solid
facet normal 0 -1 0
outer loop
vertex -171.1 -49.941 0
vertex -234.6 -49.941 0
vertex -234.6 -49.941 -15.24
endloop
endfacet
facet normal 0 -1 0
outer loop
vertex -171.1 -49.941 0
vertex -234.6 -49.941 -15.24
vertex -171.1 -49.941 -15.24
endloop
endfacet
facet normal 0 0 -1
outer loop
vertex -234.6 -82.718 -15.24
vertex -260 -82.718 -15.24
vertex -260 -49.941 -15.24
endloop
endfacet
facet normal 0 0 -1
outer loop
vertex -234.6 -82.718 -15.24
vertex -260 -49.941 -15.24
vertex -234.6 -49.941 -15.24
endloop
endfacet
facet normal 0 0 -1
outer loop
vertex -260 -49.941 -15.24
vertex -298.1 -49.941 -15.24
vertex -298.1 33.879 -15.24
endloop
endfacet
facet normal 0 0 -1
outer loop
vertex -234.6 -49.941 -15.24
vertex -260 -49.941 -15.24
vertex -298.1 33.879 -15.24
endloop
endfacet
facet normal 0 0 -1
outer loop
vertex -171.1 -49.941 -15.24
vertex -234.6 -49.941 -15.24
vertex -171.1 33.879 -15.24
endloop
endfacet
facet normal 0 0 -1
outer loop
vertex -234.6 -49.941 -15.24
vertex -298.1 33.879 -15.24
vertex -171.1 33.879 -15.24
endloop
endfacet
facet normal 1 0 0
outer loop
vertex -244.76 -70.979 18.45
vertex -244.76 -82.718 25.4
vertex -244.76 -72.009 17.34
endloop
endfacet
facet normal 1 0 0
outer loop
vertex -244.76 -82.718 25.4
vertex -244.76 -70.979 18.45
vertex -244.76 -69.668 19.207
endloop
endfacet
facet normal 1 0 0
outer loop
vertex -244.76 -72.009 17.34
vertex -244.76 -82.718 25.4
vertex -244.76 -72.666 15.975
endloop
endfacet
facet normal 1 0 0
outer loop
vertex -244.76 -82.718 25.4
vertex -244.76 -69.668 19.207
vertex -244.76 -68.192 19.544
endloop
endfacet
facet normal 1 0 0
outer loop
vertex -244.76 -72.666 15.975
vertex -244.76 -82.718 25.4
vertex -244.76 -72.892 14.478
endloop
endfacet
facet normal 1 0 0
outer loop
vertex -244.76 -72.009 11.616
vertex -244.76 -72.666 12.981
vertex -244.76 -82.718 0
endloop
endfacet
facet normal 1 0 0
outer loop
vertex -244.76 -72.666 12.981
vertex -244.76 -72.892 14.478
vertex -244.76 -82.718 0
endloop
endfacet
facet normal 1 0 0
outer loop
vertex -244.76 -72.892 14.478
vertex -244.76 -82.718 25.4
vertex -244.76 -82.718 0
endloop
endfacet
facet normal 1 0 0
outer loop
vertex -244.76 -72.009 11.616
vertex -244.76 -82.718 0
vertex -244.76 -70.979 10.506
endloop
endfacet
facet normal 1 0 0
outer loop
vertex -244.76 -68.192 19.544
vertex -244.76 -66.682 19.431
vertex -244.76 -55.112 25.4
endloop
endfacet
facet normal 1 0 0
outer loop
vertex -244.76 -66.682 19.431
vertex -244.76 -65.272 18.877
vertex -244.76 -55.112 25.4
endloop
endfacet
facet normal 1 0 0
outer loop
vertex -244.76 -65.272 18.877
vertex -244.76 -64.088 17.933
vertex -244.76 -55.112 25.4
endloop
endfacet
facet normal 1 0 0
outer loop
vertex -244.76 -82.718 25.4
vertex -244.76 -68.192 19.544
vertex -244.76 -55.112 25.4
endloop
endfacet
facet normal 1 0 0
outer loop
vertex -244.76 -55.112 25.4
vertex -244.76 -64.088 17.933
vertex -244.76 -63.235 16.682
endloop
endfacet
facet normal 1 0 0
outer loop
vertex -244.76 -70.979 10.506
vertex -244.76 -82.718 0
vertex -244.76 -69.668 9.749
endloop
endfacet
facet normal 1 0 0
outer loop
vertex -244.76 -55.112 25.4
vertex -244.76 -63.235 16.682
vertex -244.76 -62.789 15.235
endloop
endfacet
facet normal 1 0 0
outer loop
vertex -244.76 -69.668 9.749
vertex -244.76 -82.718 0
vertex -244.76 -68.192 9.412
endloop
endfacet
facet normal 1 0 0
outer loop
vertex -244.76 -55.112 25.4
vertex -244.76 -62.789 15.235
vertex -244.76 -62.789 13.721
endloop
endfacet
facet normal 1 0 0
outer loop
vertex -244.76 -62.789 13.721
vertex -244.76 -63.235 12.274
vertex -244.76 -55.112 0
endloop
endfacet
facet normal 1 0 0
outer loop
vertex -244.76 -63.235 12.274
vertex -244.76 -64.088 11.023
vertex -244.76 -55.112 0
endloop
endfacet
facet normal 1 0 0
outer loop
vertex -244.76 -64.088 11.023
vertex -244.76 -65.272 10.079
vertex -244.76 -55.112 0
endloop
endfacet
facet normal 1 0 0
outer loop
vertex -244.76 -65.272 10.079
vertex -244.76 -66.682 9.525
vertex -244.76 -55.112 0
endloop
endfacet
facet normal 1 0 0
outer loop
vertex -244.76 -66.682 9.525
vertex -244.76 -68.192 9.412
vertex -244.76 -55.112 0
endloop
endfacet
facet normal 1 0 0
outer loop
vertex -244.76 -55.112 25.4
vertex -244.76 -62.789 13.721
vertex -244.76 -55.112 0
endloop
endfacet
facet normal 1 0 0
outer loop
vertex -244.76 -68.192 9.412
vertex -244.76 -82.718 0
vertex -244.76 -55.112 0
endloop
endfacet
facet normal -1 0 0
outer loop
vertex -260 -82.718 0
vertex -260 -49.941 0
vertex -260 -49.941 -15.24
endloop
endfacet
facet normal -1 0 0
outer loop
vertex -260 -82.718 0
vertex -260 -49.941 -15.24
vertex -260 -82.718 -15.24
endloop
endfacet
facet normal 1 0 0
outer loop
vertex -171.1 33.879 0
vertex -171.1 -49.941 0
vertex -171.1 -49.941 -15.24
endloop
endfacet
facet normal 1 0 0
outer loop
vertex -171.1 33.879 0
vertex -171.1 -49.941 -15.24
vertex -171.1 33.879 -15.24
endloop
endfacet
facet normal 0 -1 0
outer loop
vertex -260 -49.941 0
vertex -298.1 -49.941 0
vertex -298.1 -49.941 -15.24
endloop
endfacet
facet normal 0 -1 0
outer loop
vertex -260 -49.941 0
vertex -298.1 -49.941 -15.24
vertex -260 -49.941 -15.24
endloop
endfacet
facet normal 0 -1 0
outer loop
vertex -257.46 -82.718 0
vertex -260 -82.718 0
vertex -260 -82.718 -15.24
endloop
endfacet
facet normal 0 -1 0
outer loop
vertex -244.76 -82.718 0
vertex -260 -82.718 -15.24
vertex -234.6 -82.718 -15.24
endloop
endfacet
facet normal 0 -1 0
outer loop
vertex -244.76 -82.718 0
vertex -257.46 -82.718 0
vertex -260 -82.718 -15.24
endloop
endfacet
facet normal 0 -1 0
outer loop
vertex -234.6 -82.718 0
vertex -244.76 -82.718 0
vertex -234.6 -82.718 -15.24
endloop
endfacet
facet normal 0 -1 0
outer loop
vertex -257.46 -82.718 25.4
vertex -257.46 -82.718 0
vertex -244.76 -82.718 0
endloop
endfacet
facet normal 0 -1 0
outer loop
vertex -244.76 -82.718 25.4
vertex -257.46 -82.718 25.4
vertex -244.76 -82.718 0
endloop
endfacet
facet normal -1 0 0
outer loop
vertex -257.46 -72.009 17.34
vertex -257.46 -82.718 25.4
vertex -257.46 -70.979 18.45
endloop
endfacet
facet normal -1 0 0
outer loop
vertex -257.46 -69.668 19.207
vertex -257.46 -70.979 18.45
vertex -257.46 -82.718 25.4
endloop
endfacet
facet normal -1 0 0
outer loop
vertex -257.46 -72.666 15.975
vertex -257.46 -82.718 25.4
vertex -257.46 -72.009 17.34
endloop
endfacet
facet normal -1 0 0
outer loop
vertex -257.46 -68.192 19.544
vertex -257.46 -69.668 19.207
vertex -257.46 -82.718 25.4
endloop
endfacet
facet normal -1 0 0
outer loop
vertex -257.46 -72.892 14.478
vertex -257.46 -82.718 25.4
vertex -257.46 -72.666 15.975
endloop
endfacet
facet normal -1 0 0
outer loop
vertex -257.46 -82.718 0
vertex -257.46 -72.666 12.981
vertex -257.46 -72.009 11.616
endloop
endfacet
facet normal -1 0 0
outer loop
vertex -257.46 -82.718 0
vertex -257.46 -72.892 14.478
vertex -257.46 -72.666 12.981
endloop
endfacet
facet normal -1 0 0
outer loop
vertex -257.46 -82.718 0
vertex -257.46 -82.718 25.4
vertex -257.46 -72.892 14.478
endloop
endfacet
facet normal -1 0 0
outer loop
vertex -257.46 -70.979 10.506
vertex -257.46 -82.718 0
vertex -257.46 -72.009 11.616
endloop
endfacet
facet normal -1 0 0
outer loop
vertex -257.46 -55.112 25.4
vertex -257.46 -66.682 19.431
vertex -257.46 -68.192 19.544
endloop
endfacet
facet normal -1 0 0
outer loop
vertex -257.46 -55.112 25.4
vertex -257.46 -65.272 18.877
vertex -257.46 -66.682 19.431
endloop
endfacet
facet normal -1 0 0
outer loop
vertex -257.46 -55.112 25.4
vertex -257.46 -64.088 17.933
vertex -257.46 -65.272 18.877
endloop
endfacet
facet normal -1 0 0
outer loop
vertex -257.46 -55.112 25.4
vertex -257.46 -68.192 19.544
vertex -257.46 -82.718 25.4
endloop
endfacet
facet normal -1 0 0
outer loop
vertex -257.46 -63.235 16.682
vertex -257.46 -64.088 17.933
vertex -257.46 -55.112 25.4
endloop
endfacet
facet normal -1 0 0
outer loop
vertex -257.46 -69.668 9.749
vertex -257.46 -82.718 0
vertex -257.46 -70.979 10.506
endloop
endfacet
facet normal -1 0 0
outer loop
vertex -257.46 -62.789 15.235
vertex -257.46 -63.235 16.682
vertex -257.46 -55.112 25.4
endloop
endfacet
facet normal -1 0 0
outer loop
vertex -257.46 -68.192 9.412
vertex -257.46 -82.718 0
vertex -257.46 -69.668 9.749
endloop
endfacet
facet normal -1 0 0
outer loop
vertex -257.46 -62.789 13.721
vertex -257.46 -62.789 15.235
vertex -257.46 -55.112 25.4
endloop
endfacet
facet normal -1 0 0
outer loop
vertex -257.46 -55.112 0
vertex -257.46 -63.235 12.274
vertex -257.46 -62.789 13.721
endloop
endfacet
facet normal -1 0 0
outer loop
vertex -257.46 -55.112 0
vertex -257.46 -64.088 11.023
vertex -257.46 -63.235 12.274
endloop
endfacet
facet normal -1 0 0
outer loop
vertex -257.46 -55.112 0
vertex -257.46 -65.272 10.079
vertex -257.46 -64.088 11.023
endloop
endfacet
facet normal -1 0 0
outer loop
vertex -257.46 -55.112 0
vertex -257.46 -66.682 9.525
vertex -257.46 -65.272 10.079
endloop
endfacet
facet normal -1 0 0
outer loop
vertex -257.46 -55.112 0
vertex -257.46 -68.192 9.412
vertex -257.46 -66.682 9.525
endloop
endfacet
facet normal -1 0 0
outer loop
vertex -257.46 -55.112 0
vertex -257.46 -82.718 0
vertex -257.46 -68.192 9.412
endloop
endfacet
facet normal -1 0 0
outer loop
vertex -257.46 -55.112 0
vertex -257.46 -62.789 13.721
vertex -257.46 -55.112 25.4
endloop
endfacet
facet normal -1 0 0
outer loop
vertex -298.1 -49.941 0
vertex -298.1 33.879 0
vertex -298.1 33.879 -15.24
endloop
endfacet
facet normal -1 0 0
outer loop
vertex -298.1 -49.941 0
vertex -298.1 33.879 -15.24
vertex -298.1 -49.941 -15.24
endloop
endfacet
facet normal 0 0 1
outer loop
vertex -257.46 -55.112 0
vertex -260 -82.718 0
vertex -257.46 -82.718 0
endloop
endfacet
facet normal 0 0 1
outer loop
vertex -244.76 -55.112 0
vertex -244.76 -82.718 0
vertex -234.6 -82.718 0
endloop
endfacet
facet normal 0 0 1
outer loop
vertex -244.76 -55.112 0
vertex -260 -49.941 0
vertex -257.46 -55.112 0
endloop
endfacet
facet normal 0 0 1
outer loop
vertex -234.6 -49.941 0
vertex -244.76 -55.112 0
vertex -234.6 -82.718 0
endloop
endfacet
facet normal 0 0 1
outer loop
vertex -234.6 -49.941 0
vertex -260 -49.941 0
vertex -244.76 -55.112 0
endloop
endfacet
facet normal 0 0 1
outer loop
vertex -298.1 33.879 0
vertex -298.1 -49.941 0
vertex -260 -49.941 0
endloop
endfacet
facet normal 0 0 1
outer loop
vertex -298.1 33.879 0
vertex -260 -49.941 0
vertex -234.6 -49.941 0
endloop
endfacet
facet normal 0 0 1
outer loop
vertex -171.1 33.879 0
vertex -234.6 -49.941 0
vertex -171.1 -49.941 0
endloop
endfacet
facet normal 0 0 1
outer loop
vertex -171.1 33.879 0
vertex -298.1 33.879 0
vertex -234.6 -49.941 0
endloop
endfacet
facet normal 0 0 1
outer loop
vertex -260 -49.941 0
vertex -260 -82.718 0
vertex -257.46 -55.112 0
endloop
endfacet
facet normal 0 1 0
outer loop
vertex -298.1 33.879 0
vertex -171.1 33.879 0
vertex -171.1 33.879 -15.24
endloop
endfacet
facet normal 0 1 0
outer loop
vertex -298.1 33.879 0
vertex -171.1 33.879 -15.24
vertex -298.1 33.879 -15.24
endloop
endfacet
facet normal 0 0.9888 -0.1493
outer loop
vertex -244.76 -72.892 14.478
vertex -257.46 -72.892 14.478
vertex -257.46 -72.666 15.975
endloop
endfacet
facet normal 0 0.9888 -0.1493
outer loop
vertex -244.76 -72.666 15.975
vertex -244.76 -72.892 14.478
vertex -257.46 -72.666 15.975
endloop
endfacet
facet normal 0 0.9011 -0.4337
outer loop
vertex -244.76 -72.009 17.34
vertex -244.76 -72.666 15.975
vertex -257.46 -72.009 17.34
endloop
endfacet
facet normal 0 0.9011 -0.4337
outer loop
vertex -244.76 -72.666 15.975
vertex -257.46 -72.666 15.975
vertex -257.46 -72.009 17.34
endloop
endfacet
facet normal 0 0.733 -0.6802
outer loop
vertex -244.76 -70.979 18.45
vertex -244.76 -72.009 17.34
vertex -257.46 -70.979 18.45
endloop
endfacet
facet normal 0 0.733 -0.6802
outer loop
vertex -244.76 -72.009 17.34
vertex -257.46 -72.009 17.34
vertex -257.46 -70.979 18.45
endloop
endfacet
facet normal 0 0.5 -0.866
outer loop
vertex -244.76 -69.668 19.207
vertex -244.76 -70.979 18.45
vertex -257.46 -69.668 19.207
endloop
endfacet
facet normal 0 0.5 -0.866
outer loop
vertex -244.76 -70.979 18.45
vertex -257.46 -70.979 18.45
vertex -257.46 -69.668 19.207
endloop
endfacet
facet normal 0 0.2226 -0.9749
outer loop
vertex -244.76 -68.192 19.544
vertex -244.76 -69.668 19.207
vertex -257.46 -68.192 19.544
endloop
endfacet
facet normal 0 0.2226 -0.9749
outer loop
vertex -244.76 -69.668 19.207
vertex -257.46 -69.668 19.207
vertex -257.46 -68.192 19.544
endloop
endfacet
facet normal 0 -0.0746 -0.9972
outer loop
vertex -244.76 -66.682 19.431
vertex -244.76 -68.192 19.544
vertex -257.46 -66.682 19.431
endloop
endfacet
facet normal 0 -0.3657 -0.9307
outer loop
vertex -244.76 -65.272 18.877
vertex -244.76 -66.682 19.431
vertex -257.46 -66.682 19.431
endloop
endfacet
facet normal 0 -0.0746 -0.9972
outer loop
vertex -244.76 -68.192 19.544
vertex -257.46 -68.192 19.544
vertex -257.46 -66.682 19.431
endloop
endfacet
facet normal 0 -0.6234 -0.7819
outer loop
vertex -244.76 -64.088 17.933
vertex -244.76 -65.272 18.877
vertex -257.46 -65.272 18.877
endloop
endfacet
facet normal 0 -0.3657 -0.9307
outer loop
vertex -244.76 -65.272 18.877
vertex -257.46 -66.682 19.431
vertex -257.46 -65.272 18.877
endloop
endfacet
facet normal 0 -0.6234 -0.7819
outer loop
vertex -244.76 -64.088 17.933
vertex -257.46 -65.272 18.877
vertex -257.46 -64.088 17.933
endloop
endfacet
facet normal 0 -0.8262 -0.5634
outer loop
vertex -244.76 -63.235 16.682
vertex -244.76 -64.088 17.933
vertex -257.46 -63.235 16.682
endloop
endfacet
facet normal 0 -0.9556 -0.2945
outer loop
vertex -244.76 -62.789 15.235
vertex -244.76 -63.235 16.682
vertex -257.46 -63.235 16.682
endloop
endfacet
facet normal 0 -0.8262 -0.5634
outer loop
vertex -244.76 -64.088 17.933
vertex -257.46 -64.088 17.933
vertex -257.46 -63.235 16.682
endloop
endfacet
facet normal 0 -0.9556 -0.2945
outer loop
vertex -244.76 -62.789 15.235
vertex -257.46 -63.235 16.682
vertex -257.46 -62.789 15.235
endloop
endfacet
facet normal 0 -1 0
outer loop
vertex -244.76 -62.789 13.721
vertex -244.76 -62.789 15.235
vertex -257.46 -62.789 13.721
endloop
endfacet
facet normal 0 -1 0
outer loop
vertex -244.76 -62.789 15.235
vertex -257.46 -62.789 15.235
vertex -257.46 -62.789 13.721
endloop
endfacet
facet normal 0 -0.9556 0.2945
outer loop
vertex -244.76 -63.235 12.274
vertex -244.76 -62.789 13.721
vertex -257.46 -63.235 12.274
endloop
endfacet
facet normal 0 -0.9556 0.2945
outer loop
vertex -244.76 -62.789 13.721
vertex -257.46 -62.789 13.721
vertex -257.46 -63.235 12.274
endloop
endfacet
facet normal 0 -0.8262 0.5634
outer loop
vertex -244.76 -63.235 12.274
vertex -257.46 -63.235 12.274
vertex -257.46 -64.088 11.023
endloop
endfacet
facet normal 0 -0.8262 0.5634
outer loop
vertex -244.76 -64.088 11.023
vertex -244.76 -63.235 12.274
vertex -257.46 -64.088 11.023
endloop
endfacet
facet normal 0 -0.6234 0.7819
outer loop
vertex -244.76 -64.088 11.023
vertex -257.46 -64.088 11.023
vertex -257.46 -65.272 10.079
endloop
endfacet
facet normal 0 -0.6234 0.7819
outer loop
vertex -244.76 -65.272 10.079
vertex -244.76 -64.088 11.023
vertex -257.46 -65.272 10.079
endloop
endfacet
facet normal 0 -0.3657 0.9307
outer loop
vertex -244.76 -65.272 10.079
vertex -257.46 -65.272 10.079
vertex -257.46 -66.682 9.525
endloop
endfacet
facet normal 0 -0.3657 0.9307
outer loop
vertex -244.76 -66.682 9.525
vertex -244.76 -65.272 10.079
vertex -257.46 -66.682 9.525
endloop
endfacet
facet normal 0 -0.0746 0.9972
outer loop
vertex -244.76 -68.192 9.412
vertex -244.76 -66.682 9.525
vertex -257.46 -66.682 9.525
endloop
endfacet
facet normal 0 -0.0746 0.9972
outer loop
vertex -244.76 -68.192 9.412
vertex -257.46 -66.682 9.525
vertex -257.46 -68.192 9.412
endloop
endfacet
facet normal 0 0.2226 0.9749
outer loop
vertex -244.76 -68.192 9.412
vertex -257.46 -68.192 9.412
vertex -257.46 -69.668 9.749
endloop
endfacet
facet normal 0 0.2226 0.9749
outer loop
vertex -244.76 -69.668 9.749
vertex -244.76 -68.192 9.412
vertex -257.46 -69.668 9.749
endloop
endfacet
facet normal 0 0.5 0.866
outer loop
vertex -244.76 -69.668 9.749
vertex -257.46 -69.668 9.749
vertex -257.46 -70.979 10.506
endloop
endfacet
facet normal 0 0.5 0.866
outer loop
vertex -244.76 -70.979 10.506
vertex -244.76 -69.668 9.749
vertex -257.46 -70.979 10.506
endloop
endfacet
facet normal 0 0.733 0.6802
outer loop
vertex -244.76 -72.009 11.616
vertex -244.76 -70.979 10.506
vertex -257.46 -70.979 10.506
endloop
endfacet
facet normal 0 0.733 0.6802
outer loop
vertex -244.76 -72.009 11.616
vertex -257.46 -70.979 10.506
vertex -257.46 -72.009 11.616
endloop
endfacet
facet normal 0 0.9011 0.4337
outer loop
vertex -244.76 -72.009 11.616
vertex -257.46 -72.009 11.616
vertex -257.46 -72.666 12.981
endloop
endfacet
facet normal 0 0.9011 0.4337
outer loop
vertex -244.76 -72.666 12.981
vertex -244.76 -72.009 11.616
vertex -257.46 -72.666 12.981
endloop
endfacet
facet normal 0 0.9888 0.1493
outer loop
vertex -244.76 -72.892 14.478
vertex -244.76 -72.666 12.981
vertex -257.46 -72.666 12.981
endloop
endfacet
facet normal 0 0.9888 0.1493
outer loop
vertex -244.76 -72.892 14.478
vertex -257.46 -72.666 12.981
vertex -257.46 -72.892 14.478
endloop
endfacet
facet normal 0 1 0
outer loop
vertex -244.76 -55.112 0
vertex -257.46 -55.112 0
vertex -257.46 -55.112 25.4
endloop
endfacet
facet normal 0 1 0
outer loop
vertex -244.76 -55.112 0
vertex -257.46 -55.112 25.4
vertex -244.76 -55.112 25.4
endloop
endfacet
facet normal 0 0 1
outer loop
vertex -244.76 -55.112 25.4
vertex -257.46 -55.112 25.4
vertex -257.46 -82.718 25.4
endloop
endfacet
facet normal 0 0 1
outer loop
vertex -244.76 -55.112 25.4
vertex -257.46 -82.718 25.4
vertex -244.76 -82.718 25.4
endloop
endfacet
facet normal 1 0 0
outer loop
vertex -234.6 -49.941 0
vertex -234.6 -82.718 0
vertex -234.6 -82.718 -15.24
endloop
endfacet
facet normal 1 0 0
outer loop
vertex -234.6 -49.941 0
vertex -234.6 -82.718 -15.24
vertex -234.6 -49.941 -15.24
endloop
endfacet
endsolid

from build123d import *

# Parameters (mm, degrees)
F0_W     = 12.7
F0_H     = 27.606282
F1_DEPTH = 25.4
F2_DEPTH = 15.24
F3_R     = 5.08
F4_DEPTH = 25.4


with BuildPart() as f1:
    # F0 (on Top) → F1 (new body)
    with BuildSketch(Plane.XY):
        with Locations((-251.110267, -68.915142)):
            Rectangle(F0_W, F0_H)
    extrude(amount=F1_DEPTH)

    # F0 (on Top) → F2 (join)
    with BuildSketch(Plane.XY):
        Polygon((-171.100267, 33.879176), (-298.100267, 33.879176), (-298.100267, -49.940824), (-260.000267, -49.940824), (-234.600267, -49.940824), (-171.100267, -49.940824), align=None)
        with Locations((-251.110267, -68.915142)):
            Rectangle(F0_W, F0_H)
        Polygon((-234.600267, -49.940824), (-260.000267, -49.940824), (-260.000267, -82.718283), (-257.460267, -82.718283), (-257.460267, -55.112001), (-244.760267, -55.112001), (-244.760267, -82.718283), (-234.600267, -82.718283), align=None)
    extrude(amount=-F2_DEPTH)

    # F3 (on face) → F4 (cut)
    with BuildSketch(Plane(origin=(-257.460267, 0, 0), x_dir=(0, -1, 0), z_dir=(-1, 0, 0))):
        with Locations((67.812001, 14.478)):
            Circle(F3_R)
    extrude(amount=-F4_DEPTH, mode=Mode.SUBTRACT)


solid = f1.part
